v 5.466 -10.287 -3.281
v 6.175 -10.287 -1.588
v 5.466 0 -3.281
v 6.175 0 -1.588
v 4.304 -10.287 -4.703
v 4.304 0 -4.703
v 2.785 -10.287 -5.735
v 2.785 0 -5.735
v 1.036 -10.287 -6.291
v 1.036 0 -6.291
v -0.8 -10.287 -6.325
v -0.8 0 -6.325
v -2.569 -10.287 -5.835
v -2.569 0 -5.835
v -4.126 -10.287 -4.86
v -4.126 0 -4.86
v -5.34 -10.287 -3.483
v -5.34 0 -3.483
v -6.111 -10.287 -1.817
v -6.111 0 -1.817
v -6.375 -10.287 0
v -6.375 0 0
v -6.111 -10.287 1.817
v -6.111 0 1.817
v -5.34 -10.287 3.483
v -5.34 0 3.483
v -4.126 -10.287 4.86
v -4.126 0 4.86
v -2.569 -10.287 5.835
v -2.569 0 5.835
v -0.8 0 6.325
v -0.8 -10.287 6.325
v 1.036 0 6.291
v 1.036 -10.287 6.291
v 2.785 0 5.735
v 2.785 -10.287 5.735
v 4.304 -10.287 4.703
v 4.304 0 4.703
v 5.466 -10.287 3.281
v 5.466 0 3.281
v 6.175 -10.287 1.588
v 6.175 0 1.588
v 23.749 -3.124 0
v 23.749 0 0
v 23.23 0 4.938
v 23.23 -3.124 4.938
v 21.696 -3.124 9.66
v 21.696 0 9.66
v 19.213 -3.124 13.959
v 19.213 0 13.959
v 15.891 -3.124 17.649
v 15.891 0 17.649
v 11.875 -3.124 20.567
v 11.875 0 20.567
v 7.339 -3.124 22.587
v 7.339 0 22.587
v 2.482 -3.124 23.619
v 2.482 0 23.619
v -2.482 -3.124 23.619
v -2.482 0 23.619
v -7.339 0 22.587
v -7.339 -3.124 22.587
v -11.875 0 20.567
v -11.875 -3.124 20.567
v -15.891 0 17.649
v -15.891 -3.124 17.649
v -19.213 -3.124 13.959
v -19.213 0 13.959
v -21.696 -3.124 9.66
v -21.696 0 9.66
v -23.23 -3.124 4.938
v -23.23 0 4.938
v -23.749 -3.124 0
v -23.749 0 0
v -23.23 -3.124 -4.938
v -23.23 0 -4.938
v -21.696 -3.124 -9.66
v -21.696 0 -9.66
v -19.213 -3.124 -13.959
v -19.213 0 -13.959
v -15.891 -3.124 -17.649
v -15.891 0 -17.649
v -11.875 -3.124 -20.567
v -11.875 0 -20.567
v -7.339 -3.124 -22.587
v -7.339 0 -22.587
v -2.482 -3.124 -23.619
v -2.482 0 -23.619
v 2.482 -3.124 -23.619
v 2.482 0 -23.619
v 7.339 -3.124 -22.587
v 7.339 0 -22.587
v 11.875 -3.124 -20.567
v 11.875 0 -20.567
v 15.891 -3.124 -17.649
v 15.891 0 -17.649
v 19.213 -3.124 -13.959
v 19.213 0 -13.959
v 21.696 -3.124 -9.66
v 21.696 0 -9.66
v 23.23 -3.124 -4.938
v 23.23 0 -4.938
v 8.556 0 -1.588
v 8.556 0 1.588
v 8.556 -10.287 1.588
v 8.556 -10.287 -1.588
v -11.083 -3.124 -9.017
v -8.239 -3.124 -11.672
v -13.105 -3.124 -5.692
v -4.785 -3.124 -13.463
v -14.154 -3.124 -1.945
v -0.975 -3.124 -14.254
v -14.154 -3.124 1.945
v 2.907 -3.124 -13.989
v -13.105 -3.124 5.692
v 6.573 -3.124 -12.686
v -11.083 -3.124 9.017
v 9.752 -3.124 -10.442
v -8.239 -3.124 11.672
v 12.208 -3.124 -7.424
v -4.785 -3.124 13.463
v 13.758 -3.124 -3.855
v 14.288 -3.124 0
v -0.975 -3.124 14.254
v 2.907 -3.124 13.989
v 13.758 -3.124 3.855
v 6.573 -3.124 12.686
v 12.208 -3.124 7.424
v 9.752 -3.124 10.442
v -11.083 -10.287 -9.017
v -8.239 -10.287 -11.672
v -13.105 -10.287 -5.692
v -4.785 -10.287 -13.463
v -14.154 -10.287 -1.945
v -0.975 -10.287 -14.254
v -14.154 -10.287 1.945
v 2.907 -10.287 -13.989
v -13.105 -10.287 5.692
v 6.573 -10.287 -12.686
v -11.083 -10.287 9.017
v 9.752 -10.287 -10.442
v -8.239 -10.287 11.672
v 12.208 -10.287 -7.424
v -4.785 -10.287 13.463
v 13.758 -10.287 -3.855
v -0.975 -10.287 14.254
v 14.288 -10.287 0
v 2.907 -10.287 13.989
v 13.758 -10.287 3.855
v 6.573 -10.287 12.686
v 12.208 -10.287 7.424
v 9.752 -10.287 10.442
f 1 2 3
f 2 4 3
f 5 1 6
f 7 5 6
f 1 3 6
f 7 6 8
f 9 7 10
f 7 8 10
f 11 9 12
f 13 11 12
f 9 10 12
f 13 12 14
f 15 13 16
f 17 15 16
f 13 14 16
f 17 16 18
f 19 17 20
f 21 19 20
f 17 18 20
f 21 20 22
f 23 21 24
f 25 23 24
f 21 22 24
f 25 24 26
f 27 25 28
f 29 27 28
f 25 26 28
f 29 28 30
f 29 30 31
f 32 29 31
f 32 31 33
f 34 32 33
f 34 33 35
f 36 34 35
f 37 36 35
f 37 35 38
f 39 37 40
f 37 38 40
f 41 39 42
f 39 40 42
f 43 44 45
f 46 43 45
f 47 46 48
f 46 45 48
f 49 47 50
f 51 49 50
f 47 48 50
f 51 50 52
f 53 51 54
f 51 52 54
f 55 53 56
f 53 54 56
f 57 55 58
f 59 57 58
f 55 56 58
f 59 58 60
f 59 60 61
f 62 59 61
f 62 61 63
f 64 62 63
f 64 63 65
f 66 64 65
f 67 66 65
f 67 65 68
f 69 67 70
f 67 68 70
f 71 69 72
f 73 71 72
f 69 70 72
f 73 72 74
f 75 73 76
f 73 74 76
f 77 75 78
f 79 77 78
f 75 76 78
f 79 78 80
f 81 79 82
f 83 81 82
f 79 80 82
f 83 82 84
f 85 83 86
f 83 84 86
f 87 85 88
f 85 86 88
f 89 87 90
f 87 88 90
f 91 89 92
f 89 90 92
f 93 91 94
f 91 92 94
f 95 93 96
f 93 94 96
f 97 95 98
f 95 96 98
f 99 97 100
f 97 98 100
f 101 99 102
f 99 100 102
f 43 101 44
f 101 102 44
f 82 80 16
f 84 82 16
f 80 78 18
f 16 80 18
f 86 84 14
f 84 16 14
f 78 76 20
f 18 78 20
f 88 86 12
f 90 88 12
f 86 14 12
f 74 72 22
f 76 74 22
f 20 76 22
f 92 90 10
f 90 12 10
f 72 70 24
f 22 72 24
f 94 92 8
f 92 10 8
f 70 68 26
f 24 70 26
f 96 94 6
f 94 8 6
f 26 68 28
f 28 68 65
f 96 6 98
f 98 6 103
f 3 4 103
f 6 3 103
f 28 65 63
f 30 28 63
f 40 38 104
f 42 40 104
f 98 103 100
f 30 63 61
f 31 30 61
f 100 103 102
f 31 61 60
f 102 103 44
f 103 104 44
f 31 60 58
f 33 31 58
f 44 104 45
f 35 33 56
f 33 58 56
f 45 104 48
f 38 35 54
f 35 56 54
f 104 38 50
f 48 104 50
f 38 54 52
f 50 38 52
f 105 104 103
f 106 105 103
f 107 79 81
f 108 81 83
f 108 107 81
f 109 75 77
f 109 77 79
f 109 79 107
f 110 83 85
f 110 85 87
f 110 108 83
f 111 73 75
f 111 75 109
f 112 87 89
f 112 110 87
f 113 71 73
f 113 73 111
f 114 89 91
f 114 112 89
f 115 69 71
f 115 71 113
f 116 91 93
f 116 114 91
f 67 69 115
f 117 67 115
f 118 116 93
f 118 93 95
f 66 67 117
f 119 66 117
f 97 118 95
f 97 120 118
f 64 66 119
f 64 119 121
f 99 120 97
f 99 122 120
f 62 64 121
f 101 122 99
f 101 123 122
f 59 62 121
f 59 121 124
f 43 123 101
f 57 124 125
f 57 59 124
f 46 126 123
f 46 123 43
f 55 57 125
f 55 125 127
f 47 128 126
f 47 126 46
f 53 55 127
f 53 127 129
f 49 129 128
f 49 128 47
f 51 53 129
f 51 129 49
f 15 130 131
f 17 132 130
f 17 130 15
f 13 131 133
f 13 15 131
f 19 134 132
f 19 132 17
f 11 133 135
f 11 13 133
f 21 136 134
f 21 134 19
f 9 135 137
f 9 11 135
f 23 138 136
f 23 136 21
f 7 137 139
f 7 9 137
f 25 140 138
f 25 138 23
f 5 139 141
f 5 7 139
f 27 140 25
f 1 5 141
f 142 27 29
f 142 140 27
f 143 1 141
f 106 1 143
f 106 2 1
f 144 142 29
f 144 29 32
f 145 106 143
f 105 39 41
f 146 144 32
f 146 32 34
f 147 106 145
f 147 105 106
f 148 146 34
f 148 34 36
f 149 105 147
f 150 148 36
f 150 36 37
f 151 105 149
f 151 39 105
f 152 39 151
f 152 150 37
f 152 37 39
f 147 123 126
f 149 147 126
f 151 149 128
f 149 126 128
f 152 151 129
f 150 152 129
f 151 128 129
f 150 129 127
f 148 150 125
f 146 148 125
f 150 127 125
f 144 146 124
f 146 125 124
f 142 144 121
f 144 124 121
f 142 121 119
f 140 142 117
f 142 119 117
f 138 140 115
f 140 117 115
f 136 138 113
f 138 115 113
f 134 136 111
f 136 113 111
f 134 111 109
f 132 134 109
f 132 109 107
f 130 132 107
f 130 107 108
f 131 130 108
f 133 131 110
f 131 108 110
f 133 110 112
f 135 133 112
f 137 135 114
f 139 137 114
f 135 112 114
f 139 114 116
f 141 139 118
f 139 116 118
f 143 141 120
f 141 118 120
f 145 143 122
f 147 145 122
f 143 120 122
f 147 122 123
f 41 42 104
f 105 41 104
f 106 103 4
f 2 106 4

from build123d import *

# Parameters (mm, degrees)
F0_R     = 23.749
F1_DEPTH = 3.1242
F2_R     = 14.2875
F3_DEPTH = 7.1628


with BuildPart() as f1:
    # F0 (on Front) → F1 (new body)
    with BuildSketch(Plane.XZ):
        Circle(F0_R)
        with BuildLine():
            ThreePointArc((6.174591, -1.5875), (-6.3754, 0), (6.174591, 1.5875))
            Line((6.174591, 1.5875), (8.555841, 1.5875))
            Line((8.555841, 1.5875), (8.555841, -1.5875))
            Line((8.555841, -1.5875), (6.174591, -1.5875))
        make_face(mode=Mode.SUBTRACT)
    extrude(amount=F1_DEPTH)

    # F2 (on face) → F3 (join)
    with BuildSketch(Plane.XZ.offset(3.1242)):
        Circle(F2_R)
        with BuildLine():
            ThreePointArc((6.174591, -1.5875), (-6.3754, 0), (6.174591, 1.5875))
            Line((6.174591, 1.5875), (8.555841, 1.5875))
            Line((8.555841, 1.5875), (8.555841, -1.5875))
            Line((8.555841, -1.5875), (6.174591, -1.5875))
        make_face(mode=Mode.SUBTRACT)
    extrude(amount=F3_DEPTH)


solid = f1.part
